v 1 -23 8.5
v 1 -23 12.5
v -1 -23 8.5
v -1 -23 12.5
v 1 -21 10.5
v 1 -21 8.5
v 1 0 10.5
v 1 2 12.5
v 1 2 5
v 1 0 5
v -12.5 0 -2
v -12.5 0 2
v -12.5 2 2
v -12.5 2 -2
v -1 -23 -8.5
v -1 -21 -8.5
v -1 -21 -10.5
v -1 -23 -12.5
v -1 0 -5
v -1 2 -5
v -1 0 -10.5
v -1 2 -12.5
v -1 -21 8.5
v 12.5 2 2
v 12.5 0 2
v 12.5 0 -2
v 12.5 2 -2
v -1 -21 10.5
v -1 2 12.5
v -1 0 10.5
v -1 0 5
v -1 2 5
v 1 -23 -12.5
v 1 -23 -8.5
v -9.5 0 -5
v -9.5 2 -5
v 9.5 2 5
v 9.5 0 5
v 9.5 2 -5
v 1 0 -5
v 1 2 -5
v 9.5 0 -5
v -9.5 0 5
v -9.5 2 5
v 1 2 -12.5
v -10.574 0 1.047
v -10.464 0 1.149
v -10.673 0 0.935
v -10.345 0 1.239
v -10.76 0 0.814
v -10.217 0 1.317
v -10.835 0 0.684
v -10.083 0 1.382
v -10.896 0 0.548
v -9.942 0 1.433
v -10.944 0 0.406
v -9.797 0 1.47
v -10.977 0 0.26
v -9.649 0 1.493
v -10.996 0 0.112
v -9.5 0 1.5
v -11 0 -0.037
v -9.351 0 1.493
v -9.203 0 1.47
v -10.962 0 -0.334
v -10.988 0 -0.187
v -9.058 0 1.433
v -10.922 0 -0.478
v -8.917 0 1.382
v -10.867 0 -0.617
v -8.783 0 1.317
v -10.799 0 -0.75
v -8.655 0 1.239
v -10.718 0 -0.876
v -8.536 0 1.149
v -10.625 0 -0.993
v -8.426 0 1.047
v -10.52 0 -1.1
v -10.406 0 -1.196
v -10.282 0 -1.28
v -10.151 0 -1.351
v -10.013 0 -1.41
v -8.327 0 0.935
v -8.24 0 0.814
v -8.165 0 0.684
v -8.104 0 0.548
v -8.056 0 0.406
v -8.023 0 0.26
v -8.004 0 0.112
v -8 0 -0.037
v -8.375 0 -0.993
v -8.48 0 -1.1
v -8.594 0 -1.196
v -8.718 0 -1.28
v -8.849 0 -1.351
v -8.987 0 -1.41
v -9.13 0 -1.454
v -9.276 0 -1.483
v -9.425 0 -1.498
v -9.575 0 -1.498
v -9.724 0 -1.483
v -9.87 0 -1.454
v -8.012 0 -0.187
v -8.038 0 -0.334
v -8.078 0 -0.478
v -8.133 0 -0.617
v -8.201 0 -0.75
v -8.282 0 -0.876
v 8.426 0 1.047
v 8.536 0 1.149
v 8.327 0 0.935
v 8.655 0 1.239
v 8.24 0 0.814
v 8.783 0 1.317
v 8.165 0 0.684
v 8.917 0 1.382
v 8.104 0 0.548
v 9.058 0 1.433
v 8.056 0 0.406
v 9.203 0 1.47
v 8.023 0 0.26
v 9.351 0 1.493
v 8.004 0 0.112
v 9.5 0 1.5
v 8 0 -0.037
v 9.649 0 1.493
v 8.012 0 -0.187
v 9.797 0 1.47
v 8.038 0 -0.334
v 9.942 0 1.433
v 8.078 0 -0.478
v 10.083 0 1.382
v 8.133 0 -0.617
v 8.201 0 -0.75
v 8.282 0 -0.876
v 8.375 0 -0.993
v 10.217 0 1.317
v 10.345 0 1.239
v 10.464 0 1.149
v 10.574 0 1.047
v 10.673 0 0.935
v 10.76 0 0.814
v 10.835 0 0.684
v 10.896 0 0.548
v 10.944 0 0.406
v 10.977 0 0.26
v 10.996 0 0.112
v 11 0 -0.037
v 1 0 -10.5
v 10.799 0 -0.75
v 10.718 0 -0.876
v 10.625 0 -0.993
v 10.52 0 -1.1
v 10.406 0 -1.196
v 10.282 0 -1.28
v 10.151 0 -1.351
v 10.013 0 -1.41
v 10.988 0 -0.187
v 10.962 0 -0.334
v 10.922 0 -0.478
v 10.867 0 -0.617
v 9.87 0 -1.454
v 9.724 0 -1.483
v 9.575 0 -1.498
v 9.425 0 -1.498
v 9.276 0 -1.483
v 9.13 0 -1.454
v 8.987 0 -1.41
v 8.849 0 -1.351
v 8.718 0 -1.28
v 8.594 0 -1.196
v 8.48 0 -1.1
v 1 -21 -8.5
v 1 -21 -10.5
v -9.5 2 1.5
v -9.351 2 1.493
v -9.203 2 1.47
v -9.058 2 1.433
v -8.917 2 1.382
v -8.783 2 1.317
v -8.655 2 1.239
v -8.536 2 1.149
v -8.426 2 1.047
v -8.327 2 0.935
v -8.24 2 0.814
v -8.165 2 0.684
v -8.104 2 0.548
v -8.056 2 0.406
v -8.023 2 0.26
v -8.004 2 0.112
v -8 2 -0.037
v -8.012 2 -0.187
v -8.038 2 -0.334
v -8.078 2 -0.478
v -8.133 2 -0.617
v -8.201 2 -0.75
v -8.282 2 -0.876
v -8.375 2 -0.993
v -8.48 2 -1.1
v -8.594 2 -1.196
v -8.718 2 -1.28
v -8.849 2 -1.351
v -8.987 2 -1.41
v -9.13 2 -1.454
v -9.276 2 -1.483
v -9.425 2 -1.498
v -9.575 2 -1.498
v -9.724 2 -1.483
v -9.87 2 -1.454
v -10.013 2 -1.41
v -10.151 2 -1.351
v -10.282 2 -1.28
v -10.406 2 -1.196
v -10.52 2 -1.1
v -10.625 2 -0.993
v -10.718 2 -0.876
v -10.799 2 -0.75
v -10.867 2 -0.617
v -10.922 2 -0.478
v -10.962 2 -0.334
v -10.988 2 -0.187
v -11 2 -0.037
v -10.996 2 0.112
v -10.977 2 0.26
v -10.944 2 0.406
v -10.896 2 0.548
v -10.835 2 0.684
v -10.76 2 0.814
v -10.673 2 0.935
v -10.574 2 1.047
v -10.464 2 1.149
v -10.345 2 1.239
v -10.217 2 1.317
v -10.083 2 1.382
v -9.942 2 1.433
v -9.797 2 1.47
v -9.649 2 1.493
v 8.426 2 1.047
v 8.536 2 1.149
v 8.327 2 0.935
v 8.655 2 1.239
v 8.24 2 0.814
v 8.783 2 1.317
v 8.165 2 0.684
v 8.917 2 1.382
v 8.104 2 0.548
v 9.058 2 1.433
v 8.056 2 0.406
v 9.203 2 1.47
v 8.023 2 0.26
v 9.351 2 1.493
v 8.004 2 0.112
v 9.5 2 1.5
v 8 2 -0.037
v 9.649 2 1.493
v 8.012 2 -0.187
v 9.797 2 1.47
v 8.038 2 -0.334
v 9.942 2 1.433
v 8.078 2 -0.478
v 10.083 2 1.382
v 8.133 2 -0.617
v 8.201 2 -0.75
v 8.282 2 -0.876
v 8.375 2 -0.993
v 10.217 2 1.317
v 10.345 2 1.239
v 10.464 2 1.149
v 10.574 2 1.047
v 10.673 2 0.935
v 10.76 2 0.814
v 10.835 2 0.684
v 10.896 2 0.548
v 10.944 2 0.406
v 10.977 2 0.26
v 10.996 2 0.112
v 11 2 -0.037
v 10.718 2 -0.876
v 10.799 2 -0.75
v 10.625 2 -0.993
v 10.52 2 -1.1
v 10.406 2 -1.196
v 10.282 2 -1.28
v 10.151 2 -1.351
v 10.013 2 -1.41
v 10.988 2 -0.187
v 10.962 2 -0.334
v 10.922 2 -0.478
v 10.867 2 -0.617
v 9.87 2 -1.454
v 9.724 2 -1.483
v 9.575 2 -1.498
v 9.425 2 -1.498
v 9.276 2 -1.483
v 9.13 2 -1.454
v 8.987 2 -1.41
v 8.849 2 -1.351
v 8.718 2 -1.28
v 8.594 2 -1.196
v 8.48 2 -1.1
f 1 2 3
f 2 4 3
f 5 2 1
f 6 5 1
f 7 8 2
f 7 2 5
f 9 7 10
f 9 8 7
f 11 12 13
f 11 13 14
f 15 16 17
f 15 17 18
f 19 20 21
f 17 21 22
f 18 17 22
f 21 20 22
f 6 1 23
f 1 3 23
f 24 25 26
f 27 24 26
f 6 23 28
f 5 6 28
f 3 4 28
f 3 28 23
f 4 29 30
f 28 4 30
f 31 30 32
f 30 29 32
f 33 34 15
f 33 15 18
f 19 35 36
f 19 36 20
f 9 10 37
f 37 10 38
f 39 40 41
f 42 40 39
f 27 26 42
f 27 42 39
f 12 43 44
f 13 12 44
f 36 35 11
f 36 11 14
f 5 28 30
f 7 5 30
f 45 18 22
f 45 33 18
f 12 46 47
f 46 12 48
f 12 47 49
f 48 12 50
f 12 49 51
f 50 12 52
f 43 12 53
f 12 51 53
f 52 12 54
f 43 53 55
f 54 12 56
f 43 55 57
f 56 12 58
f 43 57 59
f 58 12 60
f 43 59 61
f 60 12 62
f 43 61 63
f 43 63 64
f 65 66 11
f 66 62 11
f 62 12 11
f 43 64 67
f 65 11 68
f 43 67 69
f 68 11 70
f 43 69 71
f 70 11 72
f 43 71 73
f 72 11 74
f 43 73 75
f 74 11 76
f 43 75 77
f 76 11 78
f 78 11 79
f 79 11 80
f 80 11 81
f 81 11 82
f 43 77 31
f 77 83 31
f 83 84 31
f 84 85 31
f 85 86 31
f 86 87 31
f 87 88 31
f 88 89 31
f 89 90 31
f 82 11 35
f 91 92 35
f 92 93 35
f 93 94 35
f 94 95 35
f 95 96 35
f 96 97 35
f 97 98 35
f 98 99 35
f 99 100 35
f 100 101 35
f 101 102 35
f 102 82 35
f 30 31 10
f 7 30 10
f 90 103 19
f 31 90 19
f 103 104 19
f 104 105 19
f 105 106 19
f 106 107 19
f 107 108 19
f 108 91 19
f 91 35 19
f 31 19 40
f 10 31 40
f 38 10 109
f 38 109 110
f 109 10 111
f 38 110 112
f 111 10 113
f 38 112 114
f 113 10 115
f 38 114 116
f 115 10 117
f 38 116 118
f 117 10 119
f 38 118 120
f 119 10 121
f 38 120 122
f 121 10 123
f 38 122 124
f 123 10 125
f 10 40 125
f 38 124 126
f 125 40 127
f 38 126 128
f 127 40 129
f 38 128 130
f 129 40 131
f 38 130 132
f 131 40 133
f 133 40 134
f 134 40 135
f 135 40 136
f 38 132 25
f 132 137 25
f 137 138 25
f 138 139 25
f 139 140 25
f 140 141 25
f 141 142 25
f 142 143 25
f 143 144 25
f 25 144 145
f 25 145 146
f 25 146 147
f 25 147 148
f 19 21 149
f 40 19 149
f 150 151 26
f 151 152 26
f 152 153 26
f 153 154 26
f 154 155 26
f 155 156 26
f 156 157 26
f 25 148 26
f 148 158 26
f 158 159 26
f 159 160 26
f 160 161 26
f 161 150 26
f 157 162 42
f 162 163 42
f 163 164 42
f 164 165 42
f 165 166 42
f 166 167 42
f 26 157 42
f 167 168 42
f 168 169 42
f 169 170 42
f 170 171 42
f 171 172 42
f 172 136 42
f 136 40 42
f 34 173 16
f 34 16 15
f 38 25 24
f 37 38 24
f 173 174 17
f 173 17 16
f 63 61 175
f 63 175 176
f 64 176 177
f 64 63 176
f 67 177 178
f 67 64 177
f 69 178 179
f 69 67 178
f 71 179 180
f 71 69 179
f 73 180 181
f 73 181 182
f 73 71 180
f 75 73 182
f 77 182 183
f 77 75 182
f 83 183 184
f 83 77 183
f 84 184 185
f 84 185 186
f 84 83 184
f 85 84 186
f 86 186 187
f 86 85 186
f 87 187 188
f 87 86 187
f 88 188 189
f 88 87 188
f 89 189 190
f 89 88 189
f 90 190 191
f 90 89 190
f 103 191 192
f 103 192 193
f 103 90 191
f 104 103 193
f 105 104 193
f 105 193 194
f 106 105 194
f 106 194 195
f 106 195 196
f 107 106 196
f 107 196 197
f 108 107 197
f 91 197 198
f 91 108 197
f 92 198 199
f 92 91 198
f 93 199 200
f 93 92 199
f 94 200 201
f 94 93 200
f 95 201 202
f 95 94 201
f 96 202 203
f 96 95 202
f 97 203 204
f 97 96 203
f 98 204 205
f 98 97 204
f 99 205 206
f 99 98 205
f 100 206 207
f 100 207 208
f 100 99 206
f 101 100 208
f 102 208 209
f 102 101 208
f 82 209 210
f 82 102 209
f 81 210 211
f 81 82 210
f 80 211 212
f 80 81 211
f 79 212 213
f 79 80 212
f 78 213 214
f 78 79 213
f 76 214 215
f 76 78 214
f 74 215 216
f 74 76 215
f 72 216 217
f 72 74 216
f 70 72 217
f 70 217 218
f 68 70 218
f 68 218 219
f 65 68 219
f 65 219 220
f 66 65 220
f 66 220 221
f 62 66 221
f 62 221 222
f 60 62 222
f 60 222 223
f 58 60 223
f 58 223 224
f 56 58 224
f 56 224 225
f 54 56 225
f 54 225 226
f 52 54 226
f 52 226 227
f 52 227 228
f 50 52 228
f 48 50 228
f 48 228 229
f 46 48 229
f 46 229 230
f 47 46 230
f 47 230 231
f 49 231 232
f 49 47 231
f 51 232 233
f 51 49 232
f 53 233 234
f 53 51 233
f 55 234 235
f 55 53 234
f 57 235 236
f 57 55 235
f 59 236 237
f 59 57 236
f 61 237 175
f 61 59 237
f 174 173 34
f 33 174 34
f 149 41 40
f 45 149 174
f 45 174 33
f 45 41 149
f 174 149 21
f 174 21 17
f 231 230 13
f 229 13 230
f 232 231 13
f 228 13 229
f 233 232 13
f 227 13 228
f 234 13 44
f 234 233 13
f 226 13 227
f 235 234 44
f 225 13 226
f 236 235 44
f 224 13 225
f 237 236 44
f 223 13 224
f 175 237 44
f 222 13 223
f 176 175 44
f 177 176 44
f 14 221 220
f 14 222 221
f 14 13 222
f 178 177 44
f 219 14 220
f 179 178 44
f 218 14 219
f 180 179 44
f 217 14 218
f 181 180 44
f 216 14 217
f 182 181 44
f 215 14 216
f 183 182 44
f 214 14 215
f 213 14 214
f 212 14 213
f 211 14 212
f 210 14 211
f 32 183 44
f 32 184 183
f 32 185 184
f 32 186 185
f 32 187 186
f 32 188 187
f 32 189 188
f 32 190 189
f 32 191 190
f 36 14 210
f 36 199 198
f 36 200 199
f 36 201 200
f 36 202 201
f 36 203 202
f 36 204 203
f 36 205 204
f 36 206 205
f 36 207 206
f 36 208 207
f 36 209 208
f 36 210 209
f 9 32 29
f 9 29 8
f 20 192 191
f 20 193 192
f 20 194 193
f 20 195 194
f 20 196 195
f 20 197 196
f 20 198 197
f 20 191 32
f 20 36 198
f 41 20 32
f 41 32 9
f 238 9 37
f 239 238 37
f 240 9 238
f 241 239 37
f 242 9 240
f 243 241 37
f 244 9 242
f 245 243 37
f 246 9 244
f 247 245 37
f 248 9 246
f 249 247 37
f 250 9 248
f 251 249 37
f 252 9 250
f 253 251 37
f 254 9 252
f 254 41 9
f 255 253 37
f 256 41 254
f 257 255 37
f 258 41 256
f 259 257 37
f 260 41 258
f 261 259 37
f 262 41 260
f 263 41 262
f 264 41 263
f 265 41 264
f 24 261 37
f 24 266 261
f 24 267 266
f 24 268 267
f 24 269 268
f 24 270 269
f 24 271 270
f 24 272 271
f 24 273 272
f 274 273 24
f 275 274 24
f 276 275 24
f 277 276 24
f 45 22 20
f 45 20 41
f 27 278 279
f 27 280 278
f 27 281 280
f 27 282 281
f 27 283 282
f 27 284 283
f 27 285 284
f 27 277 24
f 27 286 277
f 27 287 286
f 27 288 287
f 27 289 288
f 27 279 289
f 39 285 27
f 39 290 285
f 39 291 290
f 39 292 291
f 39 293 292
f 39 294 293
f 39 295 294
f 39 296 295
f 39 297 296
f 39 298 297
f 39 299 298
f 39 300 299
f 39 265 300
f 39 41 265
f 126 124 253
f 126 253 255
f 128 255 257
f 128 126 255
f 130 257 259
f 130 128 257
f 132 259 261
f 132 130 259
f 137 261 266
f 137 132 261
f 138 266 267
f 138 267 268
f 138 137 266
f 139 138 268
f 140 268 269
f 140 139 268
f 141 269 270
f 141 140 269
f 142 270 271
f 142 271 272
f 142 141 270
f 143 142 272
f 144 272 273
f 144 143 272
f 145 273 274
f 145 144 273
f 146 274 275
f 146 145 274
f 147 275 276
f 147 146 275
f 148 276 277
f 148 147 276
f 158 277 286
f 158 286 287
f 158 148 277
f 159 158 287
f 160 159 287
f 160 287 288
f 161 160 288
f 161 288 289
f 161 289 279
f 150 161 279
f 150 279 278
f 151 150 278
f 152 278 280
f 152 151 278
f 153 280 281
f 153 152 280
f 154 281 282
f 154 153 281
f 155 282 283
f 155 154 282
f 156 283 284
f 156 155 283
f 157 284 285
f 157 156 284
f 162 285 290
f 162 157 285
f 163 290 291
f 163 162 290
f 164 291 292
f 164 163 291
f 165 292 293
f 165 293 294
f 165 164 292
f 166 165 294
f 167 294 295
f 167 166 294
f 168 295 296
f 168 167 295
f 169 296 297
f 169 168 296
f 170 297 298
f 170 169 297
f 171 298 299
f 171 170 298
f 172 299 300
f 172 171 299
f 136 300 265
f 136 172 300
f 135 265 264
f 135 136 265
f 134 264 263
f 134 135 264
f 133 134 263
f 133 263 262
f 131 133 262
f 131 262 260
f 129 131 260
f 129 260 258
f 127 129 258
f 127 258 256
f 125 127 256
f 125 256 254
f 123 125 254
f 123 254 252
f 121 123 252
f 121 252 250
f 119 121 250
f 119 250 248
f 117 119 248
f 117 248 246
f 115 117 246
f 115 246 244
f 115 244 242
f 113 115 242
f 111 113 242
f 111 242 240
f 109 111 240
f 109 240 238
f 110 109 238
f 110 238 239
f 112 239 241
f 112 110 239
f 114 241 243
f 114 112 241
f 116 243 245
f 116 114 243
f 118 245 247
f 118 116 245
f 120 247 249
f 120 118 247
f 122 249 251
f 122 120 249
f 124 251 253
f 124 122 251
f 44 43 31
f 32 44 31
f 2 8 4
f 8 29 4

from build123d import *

# Parameters (mm, degrees)
SKETCH_1_W      = 25
SKETCH_1_H      = 10
SKETCH_1_R      = 1.5
EXTRUDE_1_DEPTH = 2
EXTRUDE_3_DEPTH = 1
CHAMFER_1_SIZE  = 3


with BuildPart() as part:
    # 스케치1 → 보스-돌출1 (new body)
    with BuildSketch(Plane(origin=(0, 0, 0), x_dir=(1, 0, 0), z_dir=(0, 1, 0))):
        Rectangle(SKETCH_1_W, SKETCH_1_H)
        with Locations(Location((-9.5, 0, 0), (0, 0, 270))):
            Circle(SKETCH_1_R, mode=Mode.SUBTRACT)
        with Locations(Location((9.5, 0, 0), (0, 0, 270))):
            Circle(SKETCH_1_R, mode=Mode.SUBTRACT)
    extrude(amount=EXTRUDE_1_DEPTH)

    # 스케치4 → 보스-돌출3 (add, symmetric)
    with BuildSketch(Plane(origin=(0, 0, 0), x_dir=(0, 0, -1), z_dir=(1, 0, 0))):
        Polygon((-10.5, 0), (-5, 0), (-5, 2), (-12.5, 2), (-12.5, -23), (-8.5, -23), (-8.5, -21), (-10.5, -21), align=None)
        Polygon((5, 2), (5, 0), (10.5, 0), (10.5, -21), (8.5, -21), (8.5, -23), (12.5, -23), (12.5, 2), align=None)
    extrude(amount=EXTRUDE_3_DEPTH, both=True)

    # 모따기1
    chamfer_1_edges = [part.edges().sort_by_distance(p)[0] for p in [
        (12.5, 1, -5),
        (12.5, 1, 5),
        (-12.5, 1, -5),
        (-12.5, 1, 5),
    ]]
    chamfer(chamfer_1_edges, length=CHAMFER_1_SIZE)


solid = part.part
